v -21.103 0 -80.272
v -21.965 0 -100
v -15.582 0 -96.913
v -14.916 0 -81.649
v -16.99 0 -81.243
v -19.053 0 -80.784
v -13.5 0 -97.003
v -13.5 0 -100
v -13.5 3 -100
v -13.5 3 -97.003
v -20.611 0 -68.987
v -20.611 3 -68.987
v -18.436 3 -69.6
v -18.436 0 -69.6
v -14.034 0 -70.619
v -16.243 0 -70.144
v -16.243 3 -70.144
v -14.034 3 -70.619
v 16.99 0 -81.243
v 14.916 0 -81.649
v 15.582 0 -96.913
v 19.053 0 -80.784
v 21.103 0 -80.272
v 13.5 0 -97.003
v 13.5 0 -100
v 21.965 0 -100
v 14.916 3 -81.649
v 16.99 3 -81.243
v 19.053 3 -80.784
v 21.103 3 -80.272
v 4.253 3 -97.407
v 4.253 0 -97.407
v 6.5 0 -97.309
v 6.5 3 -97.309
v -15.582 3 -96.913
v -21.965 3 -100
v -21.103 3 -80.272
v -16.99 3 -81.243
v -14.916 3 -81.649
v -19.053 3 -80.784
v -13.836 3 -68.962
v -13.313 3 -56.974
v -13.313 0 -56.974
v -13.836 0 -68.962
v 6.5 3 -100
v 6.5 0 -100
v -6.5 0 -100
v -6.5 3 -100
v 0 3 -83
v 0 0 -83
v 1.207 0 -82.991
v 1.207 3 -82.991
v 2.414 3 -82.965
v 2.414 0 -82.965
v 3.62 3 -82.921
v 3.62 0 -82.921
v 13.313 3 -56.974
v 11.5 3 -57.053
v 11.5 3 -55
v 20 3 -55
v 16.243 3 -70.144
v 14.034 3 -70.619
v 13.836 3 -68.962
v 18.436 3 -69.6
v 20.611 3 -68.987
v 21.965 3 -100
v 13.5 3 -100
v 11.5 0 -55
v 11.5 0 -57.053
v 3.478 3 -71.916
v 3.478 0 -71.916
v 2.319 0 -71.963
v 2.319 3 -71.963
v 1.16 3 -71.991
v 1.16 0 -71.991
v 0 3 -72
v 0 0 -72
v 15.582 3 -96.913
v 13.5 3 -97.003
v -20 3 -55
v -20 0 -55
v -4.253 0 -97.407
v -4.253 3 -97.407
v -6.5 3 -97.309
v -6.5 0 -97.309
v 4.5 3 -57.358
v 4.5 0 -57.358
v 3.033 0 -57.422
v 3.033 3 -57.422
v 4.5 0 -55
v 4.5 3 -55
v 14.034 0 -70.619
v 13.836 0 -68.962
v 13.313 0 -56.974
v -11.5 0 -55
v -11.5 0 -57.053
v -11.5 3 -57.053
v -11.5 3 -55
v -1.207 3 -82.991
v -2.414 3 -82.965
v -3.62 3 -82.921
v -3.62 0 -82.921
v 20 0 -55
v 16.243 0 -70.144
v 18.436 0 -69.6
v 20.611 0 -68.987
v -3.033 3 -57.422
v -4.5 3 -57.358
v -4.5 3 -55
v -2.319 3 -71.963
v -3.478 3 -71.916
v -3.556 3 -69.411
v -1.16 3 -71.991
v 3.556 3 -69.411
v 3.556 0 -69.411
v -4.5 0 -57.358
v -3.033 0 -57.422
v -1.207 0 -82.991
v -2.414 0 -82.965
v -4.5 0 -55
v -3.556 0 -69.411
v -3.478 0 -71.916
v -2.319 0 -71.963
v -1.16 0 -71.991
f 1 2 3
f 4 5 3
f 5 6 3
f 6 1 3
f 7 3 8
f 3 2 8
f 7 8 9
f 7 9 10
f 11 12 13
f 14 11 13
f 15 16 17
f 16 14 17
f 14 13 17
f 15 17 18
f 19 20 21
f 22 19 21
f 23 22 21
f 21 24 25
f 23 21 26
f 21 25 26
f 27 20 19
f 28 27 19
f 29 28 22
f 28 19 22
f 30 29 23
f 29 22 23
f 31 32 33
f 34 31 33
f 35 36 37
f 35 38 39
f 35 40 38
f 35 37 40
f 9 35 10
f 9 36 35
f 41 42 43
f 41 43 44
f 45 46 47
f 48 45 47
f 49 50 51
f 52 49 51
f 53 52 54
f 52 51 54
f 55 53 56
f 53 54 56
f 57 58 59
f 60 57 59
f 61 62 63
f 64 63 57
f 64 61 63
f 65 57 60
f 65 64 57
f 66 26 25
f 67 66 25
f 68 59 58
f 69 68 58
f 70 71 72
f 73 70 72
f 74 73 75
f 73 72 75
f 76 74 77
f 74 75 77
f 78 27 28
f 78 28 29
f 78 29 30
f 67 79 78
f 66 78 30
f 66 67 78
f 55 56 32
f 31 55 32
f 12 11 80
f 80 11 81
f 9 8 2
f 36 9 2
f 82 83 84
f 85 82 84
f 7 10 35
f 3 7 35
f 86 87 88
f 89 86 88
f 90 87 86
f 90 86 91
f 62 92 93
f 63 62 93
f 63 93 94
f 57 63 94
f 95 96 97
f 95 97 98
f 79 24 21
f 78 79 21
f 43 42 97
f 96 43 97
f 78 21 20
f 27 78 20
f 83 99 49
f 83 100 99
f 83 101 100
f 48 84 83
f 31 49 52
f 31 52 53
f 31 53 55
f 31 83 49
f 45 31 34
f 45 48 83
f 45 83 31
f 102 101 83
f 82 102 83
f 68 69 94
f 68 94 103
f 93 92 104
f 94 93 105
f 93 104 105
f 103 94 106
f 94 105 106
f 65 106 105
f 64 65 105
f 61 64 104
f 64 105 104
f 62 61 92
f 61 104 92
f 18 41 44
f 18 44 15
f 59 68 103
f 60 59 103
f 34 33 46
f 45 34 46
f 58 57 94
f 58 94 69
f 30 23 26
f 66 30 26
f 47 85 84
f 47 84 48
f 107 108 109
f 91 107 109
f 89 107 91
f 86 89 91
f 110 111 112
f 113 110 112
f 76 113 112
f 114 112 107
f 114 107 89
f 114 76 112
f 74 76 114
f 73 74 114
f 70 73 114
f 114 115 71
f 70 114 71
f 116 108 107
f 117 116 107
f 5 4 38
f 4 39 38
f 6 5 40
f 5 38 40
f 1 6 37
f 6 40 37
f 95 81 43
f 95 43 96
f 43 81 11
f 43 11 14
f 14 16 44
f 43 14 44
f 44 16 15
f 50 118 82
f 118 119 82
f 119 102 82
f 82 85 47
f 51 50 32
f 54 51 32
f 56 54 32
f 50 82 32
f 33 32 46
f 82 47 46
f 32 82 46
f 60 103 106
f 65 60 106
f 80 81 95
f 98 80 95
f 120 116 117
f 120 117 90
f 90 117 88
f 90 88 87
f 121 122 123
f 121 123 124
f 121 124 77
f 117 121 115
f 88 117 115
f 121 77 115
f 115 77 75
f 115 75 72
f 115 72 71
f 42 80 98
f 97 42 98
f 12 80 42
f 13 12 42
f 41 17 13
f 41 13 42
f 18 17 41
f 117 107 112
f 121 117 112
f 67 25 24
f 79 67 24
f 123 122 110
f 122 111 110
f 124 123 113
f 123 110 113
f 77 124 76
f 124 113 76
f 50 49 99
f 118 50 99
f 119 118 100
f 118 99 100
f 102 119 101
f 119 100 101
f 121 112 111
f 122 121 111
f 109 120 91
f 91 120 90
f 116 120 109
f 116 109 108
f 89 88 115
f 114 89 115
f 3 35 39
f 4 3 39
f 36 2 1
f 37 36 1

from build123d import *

# Parameters (mm, degrees)
BOSS_EXTRUDE1_DEPTH      = 3
CUT_EXTRUDE1_DEPTH       = 103.427778996
BOSS_EXTRUDE2_DEPTH      = 3
CUT_EXTRUDE5_DEPTH       = 103.427778996
MIRROR4_DEPTH            = 3
CUT_EXTRUDE7_DEPTH       = 103.427778996
CUT_EXTRUDE7_DEPTH_BACK  = 103.427778996
CUT_EXTRUDE8_DEPTH       = 103.427778996
CUT_EXTRUDE8_DEPTH_BACK  = 103.427778996
CUT_EXTRUDE9_DEPTH       = 103.427778996
CUT_EXTRUDE9_DEPTH_BACK  = 103.427778996
CUT_EXTRUDE10_DEPTH      = 103.427778996
CUT_EXTRUDE10_DEPTH_BACK = 103.427778996


# Read off the part's stored shape, not the designer's step: Mirror4
with BuildPart() as part:
    # Sketch1 → Boss-Extrude1 (new body)
    with BuildSketch(Plane(origin=(0, 0, 0), x_dir=(1, 0, 0), z_dir=(0, 1, 0))):
        Polygon((-21.964742431, 100), (-20, 55), (0, 55), (0, 100), align=None)
    extrude(amount=BOSS_EXTRUDE1_DEPTH)

    # Sketch2 → Cut-Extrude1 (cut, symmetric)
    with BuildSketch(Plane(origin=(0, 3, 0), x_dir=(1, 0, 0), z_dir=(0, 1, 0))):
        Polygon((-13.837321606, 56.950628888), (-2.508114774, 57.445272741), (-4.252890268, 97.407201604), (-15.582097101, 96.912557752), align=None)
    extrude(amount=CUT_EXTRUDE1_DEPTH, both=True, mode=Mode.SUBTRACT)

    # Sketch6 → Boss-Extrude2 (add)
    with BuildSketch(Plane(origin=(0, 3, 0), x_dir=(1, 0, 0), z_dir=(0, 1, 0))):
        Polygon((-13.837321606, 56.950628888), (-13.31282129, 56.973529067), (-13.836253938, 68.962107726), (-14.666089966, 75.932545098), align=None)
    boss_extrude2 = extrude(amount=-BOSS_EXTRUDE2_DEPTH)

    # Mirror3: Boss-Extrude2 across plane
    add(boss_extrude2.mirror(Plane(origin=(-5.664603416, 0, 0.247321926), x_dir=(0.043619387365336264, 0, 0.9990482215818577), z_dir=(0.9990482215818578, 0, -0.043619387365336264))))

    # Sketch11 → Cut-Extrude5 (cut, symmetric)
    with BuildSketch(Plane(origin=(0, 3, 0), x_dir=(1, 0, 0), z_dir=(0, 1, 0))):
        with BuildLine():
            Line((-21.103413479, 80.272323621), (-20.610683569, 68.98695328))
            ThreePointArc((-20.610683569, 68.98695328), (-10.414877912, 71.24275625), (0, 72))
            Line((0, 72), (0, 83))
            ThreePointArc((0, 83), (-10.639481647, 82.315256364), (-21.103413479, 80.272323621))
        make_face()
    extrude(amount=CUT_EXTRUDE5_DEPTH, both=True, mode=Mode.SUBTRACT)


with BuildPart() as cut_extrude5_piece_1:
    # of the separate pieces the step leaves, piece 1, a body of its own (cut_extrude5_pieces)
    add(part.part.solids().sort_by_distance((-21.964742431, 0, -100))[0])



with BuildPart() as cut_extrude5_piece_2:
    # of the separate pieces the step leaves, piece 2, a body of its own (cut_extrude5_pieces)
    add(part.part.solids().sort_by_distance((-20.610683569, 0, -68.98695328))[0])


with BuildPart() as cut_extrude5_piece_1_1:
    add(cut_extrude5_piece_1.part)

    add(cut_extrude5_piece_2.part)  # Mirror4 merges Cut-Extrude5 piece 2
    # Mirror4 outline → Mirror4 (add)
    with BuildSketch(Plane(origin=(0, 0, 0), x_dir=(1, 0, 0), z_dir=(0, 1, 0))):
        with BuildLine():
            Line((21.964742431, 100), (0, 100))
            Line((0, 100), (0, 83))
            ThreePointArc((0, 83), (1.810635458, 82.980248248), (3.620409151, 82.921002391))
            Line((3.620409151, 82.921002391), (4.252890268, 97.407201604))
            Line((4.252890268, 97.407201604), (15.582097101, 96.912557752))
            Line((15.582097101, 96.912557752), (14.915666073, 81.648777735))
            ThreePointArc((14.915666073, 81.648777735), (18.022685133, 81.019644658), (21.103413479, 80.272323621))
            Line((21.103413479, 80.272323621), (21.964742431, 100))
        make_face()
        with BuildLine():
            Line((20, 55), (20.610683569, 68.98695328))
            ThreePointArc((20.610683569, 68.98695328), (17.341316245, 69.880460437), (14.033522659, 70.619120936))
            Line((14.033522659, 70.619120936), (13.836253938, 68.962107726))
            Line((13.836253938, 68.962107726), (13.31282129, 56.973529067))
            Line((13.31282129, 56.973529067), (3.03261509, 57.422372563))
            Line((3.03261509, 57.422372563), (3.556047738, 69.410951222))
            Line((3.556047738, 69.410951222), (3.47779944, 71.915957277))
            ThreePointArc((3.47779944, 71.915957277), (1.739407379, 71.978986253), (0, 72))
            Line((0, 72), (0, 55))
            Line((0, 55), (20, 55))
        make_face()
    extrude(amount=MIRROR4_DEPTH)

    # Sketch7 → Cut-Extrude7 (cut, two sides: drawn at the far end of the back side and taken through both)
    with BuildSketch(Plane(origin=(0, 3, 0), x_dir=(1, 0, 0), z_dir=(0, 1, 0)).offset(-CUT_EXTRUDE7_DEPTH_BACK)):
        Polygon((-13.5, 100), (-13.5, 97.003464074), (-6.5, 97.309090675), (-6.5, 100), align=None)
    extrude(amount=CUT_EXTRUDE7_DEPTH + CUT_EXTRUDE7_DEPTH_BACK, mode=Mode.SUBTRACT)

    # Sketch13 → Cut-Extrude8 (cut, two sides: drawn at the far end of the back side and taken through both)
    with BuildSketch(Plane(origin=(0, 3, 0), x_dir=(1, 0, 0), z_dir=(0, 1, 0)).offset(-CUT_EXTRUDE8_DEPTH_BACK)):
        Polygon((6.5, 97.309090675), (6.5, 100), (13.5, 100), (13.5, 97.003464074), align=None)
    extrude(amount=CUT_EXTRUDE8_DEPTH + CUT_EXTRUDE8_DEPTH_BACK, mode=Mode.SUBTRACT)

    # Sketch14 → Cut-Extrude9 (cut, two sides: drawn at the far end of the back side and taken through both)
    with BuildSketch(Plane(origin=(0, 3, 0), x_dir=(1, 0, 0), z_dir=(0, 1, 0)).offset(-CUT_EXTRUDE9_DEPTH_BACK)):
        Polygon((-11.5, 57.052678553), (-11.5, 55), (-4.5, 55), (-4.5, 57.358305154), align=None)
    extrude(amount=CUT_EXTRUDE9_DEPTH + CUT_EXTRUDE9_DEPTH_BACK, mode=Mode.SUBTRACT)

    # Sketch15 → Cut-Extrude10 (cut, two sides: drawn at the far end of the back side and taken through both)
    with BuildSketch(Plane(origin=(0, 3, 0), x_dir=(1, 0, 0), z_dir=(0, 1, 0)).offset(-CUT_EXTRUDE10_DEPTH_BACK)):
        Polygon((4.5, 57.358305154), (4.5, 55), (11.5, 55), (11.5, 57.052678553), align=None)
    extrude(amount=CUT_EXTRUDE10_DEPTH + CUT_EXTRUDE10_DEPTH_BACK, mode=Mode.SUBTRACT)


solid = cut_extrude5_piece_1_1.part
